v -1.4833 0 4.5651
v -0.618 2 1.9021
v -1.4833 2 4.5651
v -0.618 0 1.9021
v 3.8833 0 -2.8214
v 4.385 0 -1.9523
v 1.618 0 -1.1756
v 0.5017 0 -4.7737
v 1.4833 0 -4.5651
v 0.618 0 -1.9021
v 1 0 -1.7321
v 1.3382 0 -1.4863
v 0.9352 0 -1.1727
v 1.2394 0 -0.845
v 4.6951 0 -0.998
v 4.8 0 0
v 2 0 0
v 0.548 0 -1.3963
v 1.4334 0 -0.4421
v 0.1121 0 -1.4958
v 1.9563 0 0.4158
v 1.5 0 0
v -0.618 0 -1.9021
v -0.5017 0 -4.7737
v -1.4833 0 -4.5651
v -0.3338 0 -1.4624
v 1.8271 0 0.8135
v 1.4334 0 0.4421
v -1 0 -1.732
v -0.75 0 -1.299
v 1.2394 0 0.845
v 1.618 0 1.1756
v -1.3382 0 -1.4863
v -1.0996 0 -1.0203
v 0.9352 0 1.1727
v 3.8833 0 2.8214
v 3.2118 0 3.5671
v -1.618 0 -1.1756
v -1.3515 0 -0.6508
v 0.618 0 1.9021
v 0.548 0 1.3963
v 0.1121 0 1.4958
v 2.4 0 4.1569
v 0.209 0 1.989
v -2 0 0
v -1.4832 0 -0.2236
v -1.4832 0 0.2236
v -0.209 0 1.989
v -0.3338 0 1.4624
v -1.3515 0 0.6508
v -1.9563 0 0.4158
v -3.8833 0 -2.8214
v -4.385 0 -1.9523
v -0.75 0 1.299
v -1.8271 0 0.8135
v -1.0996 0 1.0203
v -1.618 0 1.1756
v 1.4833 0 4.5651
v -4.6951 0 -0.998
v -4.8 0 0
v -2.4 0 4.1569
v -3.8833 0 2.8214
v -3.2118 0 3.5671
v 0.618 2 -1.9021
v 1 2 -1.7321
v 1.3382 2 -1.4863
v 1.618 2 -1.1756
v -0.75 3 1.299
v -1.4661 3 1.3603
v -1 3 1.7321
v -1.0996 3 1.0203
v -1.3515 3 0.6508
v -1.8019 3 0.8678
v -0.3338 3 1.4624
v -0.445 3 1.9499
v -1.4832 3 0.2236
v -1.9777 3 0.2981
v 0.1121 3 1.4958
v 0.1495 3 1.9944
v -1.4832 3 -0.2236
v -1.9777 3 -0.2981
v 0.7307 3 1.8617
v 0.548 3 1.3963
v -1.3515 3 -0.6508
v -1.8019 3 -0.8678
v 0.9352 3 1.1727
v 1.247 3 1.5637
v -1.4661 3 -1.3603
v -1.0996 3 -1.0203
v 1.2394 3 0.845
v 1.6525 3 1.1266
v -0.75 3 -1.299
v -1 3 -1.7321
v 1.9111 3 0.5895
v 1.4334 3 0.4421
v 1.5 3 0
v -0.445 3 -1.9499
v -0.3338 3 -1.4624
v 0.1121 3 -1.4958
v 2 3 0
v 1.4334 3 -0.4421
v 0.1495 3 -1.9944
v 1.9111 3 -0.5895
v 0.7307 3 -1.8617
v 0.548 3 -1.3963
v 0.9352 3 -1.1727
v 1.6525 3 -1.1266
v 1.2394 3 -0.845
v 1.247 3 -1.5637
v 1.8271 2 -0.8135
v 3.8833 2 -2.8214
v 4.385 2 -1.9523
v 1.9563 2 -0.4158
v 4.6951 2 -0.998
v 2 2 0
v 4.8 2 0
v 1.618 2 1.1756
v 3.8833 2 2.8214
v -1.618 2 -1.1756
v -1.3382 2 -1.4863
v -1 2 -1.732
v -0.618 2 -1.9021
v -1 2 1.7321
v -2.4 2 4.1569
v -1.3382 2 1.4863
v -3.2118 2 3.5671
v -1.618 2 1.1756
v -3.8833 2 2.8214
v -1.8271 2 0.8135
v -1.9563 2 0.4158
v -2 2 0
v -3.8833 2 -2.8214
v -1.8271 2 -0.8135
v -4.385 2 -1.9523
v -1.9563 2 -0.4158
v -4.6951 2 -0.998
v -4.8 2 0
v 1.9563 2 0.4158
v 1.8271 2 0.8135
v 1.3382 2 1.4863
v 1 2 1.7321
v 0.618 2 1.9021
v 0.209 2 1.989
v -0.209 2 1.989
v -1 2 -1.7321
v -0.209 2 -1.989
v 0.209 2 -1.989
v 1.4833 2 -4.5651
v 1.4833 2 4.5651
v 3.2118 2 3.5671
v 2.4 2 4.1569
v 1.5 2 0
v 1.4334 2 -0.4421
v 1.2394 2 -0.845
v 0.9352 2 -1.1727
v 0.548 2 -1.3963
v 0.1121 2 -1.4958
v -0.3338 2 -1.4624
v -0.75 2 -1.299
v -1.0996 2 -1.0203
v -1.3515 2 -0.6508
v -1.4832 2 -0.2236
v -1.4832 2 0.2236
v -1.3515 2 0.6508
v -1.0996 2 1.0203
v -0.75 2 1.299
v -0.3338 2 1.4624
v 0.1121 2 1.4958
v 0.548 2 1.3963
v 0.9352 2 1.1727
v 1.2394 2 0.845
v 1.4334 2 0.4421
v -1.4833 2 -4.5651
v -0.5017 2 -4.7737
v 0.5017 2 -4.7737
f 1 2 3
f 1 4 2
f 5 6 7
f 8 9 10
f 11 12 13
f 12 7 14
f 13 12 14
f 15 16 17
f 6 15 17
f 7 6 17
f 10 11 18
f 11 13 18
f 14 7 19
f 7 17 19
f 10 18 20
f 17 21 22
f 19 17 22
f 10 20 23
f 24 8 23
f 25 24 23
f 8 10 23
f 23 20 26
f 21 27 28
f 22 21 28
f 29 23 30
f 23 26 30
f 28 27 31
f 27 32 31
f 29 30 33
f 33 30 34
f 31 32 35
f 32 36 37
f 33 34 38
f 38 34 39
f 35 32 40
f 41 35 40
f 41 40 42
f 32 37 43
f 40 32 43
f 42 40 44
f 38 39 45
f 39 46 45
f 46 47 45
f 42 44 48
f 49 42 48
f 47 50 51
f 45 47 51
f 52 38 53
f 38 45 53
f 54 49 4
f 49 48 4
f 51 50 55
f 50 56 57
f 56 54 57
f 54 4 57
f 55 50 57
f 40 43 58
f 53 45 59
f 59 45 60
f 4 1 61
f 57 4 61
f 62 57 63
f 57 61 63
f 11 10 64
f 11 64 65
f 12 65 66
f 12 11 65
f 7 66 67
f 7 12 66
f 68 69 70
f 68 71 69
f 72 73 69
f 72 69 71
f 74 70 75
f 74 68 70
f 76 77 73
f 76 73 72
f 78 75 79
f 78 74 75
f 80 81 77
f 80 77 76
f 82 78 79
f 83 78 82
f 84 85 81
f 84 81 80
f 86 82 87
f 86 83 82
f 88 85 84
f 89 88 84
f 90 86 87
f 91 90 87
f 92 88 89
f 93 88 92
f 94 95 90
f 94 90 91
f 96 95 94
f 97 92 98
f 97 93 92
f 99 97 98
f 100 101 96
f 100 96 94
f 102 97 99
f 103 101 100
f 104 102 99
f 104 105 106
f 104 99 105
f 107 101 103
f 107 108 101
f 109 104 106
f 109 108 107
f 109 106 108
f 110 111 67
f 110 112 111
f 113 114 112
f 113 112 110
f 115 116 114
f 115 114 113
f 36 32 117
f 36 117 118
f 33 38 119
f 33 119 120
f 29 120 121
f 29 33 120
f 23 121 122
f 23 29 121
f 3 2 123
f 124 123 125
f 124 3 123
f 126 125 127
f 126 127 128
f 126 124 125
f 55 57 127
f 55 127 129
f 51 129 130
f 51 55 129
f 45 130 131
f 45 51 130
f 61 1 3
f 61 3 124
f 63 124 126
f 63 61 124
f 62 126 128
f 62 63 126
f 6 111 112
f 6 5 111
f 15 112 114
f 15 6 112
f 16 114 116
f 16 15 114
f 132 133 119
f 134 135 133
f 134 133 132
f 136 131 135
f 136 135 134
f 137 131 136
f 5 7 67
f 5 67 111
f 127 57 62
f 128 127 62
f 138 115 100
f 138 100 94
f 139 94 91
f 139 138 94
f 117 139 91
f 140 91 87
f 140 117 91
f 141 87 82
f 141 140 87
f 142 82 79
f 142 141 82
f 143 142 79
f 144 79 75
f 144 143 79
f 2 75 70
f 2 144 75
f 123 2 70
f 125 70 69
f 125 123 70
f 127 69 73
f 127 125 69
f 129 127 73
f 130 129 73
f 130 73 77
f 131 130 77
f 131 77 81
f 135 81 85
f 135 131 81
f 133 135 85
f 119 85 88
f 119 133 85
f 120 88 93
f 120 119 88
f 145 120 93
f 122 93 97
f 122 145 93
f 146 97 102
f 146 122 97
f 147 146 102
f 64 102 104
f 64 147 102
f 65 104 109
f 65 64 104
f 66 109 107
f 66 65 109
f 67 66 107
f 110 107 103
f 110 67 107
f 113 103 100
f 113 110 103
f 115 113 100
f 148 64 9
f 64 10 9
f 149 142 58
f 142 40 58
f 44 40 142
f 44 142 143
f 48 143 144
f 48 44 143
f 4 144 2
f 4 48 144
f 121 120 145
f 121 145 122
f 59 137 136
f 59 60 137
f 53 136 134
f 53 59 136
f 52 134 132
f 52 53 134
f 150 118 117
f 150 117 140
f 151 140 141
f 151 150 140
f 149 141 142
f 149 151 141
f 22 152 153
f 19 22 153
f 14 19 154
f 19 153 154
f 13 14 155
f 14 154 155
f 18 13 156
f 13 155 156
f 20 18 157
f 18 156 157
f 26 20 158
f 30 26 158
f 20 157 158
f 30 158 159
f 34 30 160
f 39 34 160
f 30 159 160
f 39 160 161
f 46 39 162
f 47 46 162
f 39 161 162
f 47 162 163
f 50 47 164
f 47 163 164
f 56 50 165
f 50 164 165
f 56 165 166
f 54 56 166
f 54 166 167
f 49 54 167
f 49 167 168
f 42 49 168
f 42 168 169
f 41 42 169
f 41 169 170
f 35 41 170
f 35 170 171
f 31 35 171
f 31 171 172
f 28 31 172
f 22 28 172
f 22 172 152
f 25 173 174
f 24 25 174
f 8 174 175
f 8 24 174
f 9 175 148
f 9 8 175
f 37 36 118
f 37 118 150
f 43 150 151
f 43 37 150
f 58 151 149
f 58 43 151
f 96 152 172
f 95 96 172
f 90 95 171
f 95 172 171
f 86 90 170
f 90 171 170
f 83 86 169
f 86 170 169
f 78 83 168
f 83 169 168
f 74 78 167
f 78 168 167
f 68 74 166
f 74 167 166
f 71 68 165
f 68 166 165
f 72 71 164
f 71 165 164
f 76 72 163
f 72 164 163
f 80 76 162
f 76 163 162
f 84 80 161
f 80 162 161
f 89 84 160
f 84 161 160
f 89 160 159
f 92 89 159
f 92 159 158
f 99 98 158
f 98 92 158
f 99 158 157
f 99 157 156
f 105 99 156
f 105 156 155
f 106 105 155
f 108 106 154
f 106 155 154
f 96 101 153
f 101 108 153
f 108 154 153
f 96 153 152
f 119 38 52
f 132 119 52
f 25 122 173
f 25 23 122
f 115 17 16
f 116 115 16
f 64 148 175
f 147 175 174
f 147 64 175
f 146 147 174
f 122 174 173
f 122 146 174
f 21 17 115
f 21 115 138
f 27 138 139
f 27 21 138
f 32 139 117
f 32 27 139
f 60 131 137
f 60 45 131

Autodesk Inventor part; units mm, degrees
ref_plane "YZ Plane" through (0, 0, 0) normal (1, 0, 0) x (0, 1, 0)
ref_plane "XZ Plane" through (0, 0, 0) normal (0, 1, 0) x (-1, 0, 0)
ref_plane "XY Plane" through (0, 0, 0) normal (0, 0, 1) x (1, 0, 0)
sketch "Sketch2" plane through (0, 0, 0) normal (0, 1, 0) x (-1, 0, 0)
  circle A0 centre (0, 0) radius 4.8
  line L0 (1.618, 1.1756) -> (3.8833, 2.8214)
  line L1 (0.618, 1.9021) -> (1.4833, 4.5651)
  line L2 (-0.618, 1.9021) -> (-1.4833, 4.5651)
  line L3 (-1.618, 1.1756) -> (-3.8833, 2.8214)
  line L4 (-2, 0) -> (-4.8, 0)
  line L5 (1.618, -1.1756) -> (3.8833, -2.8214)
  line L6 (0.618, -1.9021) -> (1.4833, -4.5651)
  line L7 (-0.618, -1.9021) -> (-1.4833, -4.5651)
  line L8 (-1.618, -1.1756) -> (-3.8833, -2.8214)
  arc A1 (2, 0) -> (1.618, 1.1756) centre (0, 0) ccw
  arc A2 (0.618, -1.9021) -> (1.618, -1.1756) centre (0, 0) ccw
  arc A3 (-1.618, -1.1756) -> (-0.618, -1.9021) centre (0, 0) ccw
  arc A4 (0.618, 1.9021) -> (-0.618, 1.9021) centre (0, 0) ccw
  arc A5 (-1.618, 1.1756) -> (-2, 0) centre (0, 0) ccw
  line L9 (2, 0) -> (4.8, 0)
  dimension "d22" = 9.6
extrude "Extrusion1" add sketch "Sketch2" along normal blind 2 contours A0 L5 A2 L6 L7 A3 L8 L4 A5 L3 L2 A4 L1 L0 A1 L9
sketch "Sketch3" plane through (0, 2, 0) normal (0, 1, 0) x (1, 0, 0)
  circle A0 centre (0, 0) radius 2
  circle A1 centre (0, 0) radius 1.5
  dimension "d39" = 3
  dimension "d44" = 4
extrude "Extrusion2" add sketch "Sketch3" along normal blind 1 contours A0 | A1
extrude "Extrusion3" cut sketch "Sketch3" along normal blind 1 and the other way blind 2 contours A1
properties part number "Encoder_helice"
